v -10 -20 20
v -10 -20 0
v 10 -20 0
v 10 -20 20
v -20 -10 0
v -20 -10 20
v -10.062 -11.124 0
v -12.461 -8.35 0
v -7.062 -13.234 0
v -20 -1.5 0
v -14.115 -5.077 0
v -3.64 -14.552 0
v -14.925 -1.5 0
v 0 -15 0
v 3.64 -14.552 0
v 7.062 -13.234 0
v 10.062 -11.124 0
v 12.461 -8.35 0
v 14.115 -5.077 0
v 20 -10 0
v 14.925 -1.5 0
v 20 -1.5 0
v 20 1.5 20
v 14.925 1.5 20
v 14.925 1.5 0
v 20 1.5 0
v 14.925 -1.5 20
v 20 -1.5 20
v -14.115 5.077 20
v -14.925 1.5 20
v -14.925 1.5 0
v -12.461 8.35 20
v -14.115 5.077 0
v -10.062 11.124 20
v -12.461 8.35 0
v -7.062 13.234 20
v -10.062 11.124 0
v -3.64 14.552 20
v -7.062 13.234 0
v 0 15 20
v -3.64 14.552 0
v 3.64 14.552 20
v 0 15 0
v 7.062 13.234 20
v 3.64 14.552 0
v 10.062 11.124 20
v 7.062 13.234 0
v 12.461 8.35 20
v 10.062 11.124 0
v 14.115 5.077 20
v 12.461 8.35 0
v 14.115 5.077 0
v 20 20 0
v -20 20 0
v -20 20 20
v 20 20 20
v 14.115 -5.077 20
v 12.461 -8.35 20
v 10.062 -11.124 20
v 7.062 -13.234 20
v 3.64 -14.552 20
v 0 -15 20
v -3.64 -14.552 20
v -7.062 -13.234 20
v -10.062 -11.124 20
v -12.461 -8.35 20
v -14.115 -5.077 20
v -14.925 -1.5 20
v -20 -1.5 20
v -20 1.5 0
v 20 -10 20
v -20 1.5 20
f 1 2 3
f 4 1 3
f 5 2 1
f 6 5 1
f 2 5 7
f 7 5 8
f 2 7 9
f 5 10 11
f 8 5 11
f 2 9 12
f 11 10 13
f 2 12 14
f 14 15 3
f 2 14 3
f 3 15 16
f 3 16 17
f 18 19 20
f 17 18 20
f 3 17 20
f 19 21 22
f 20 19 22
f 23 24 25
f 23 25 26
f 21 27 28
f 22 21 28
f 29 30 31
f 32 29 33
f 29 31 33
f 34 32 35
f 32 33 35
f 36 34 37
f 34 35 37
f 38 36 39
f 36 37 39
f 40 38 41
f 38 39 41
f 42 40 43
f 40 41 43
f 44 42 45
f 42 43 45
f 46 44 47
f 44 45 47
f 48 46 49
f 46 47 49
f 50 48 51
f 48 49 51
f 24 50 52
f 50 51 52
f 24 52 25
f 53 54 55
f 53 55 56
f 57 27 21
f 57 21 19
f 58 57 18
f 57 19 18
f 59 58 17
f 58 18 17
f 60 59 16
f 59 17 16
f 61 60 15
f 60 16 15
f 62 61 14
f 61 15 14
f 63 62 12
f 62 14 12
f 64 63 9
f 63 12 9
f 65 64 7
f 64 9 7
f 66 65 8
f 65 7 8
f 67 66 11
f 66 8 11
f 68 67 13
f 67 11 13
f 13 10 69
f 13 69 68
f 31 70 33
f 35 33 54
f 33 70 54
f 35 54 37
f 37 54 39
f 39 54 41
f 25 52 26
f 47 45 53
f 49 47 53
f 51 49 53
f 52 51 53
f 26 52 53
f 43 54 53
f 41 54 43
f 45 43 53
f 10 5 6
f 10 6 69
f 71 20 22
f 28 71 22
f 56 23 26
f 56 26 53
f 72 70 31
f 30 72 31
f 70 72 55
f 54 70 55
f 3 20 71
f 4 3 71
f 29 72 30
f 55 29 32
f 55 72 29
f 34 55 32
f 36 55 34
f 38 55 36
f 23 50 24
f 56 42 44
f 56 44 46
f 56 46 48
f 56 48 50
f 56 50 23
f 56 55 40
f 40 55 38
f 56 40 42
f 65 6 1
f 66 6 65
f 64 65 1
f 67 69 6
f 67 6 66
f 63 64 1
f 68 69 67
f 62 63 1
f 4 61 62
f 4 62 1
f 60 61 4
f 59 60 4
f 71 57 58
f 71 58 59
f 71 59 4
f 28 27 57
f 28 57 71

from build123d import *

# Parameters (mm, degrees)
F0_W     = 40
F0_H     = 40
F1_DEPTH = 20
F3_D     = 30
F4_W     = 40
F4_H     = 3
F5_DEPTH = 25
F6_SIZE  = 10


with BuildPart() as f1:
    # F0 (on Top) → F1 (new body)
    with BuildSketch(Plane.XY):
        Rectangle(F0_W, F0_H)
    extrude(amount=F1_DEPTH)

    # F3 (through all)
    with Locations(Plane.XY.offset(20)):
        with Locations((0, 0)):
            Hole(F3_D / 2)

    # F4 (on face) → F5 (cut)
    with BuildSketch(Plane.XY.offset(20)):
        Rectangle(F4_W, F4_H)
    extrude(amount=-F5_DEPTH, mode=Mode.SUBTRACT)

    # F6
    f6_edges = [f1.edges().sort_by_distance(p)[0] for p in [
        (-20, -20, 10),
        (20, -20, 10),
    ]]
    chamfer(f6_edges, length=F6_SIZE)


solid = f1.part
